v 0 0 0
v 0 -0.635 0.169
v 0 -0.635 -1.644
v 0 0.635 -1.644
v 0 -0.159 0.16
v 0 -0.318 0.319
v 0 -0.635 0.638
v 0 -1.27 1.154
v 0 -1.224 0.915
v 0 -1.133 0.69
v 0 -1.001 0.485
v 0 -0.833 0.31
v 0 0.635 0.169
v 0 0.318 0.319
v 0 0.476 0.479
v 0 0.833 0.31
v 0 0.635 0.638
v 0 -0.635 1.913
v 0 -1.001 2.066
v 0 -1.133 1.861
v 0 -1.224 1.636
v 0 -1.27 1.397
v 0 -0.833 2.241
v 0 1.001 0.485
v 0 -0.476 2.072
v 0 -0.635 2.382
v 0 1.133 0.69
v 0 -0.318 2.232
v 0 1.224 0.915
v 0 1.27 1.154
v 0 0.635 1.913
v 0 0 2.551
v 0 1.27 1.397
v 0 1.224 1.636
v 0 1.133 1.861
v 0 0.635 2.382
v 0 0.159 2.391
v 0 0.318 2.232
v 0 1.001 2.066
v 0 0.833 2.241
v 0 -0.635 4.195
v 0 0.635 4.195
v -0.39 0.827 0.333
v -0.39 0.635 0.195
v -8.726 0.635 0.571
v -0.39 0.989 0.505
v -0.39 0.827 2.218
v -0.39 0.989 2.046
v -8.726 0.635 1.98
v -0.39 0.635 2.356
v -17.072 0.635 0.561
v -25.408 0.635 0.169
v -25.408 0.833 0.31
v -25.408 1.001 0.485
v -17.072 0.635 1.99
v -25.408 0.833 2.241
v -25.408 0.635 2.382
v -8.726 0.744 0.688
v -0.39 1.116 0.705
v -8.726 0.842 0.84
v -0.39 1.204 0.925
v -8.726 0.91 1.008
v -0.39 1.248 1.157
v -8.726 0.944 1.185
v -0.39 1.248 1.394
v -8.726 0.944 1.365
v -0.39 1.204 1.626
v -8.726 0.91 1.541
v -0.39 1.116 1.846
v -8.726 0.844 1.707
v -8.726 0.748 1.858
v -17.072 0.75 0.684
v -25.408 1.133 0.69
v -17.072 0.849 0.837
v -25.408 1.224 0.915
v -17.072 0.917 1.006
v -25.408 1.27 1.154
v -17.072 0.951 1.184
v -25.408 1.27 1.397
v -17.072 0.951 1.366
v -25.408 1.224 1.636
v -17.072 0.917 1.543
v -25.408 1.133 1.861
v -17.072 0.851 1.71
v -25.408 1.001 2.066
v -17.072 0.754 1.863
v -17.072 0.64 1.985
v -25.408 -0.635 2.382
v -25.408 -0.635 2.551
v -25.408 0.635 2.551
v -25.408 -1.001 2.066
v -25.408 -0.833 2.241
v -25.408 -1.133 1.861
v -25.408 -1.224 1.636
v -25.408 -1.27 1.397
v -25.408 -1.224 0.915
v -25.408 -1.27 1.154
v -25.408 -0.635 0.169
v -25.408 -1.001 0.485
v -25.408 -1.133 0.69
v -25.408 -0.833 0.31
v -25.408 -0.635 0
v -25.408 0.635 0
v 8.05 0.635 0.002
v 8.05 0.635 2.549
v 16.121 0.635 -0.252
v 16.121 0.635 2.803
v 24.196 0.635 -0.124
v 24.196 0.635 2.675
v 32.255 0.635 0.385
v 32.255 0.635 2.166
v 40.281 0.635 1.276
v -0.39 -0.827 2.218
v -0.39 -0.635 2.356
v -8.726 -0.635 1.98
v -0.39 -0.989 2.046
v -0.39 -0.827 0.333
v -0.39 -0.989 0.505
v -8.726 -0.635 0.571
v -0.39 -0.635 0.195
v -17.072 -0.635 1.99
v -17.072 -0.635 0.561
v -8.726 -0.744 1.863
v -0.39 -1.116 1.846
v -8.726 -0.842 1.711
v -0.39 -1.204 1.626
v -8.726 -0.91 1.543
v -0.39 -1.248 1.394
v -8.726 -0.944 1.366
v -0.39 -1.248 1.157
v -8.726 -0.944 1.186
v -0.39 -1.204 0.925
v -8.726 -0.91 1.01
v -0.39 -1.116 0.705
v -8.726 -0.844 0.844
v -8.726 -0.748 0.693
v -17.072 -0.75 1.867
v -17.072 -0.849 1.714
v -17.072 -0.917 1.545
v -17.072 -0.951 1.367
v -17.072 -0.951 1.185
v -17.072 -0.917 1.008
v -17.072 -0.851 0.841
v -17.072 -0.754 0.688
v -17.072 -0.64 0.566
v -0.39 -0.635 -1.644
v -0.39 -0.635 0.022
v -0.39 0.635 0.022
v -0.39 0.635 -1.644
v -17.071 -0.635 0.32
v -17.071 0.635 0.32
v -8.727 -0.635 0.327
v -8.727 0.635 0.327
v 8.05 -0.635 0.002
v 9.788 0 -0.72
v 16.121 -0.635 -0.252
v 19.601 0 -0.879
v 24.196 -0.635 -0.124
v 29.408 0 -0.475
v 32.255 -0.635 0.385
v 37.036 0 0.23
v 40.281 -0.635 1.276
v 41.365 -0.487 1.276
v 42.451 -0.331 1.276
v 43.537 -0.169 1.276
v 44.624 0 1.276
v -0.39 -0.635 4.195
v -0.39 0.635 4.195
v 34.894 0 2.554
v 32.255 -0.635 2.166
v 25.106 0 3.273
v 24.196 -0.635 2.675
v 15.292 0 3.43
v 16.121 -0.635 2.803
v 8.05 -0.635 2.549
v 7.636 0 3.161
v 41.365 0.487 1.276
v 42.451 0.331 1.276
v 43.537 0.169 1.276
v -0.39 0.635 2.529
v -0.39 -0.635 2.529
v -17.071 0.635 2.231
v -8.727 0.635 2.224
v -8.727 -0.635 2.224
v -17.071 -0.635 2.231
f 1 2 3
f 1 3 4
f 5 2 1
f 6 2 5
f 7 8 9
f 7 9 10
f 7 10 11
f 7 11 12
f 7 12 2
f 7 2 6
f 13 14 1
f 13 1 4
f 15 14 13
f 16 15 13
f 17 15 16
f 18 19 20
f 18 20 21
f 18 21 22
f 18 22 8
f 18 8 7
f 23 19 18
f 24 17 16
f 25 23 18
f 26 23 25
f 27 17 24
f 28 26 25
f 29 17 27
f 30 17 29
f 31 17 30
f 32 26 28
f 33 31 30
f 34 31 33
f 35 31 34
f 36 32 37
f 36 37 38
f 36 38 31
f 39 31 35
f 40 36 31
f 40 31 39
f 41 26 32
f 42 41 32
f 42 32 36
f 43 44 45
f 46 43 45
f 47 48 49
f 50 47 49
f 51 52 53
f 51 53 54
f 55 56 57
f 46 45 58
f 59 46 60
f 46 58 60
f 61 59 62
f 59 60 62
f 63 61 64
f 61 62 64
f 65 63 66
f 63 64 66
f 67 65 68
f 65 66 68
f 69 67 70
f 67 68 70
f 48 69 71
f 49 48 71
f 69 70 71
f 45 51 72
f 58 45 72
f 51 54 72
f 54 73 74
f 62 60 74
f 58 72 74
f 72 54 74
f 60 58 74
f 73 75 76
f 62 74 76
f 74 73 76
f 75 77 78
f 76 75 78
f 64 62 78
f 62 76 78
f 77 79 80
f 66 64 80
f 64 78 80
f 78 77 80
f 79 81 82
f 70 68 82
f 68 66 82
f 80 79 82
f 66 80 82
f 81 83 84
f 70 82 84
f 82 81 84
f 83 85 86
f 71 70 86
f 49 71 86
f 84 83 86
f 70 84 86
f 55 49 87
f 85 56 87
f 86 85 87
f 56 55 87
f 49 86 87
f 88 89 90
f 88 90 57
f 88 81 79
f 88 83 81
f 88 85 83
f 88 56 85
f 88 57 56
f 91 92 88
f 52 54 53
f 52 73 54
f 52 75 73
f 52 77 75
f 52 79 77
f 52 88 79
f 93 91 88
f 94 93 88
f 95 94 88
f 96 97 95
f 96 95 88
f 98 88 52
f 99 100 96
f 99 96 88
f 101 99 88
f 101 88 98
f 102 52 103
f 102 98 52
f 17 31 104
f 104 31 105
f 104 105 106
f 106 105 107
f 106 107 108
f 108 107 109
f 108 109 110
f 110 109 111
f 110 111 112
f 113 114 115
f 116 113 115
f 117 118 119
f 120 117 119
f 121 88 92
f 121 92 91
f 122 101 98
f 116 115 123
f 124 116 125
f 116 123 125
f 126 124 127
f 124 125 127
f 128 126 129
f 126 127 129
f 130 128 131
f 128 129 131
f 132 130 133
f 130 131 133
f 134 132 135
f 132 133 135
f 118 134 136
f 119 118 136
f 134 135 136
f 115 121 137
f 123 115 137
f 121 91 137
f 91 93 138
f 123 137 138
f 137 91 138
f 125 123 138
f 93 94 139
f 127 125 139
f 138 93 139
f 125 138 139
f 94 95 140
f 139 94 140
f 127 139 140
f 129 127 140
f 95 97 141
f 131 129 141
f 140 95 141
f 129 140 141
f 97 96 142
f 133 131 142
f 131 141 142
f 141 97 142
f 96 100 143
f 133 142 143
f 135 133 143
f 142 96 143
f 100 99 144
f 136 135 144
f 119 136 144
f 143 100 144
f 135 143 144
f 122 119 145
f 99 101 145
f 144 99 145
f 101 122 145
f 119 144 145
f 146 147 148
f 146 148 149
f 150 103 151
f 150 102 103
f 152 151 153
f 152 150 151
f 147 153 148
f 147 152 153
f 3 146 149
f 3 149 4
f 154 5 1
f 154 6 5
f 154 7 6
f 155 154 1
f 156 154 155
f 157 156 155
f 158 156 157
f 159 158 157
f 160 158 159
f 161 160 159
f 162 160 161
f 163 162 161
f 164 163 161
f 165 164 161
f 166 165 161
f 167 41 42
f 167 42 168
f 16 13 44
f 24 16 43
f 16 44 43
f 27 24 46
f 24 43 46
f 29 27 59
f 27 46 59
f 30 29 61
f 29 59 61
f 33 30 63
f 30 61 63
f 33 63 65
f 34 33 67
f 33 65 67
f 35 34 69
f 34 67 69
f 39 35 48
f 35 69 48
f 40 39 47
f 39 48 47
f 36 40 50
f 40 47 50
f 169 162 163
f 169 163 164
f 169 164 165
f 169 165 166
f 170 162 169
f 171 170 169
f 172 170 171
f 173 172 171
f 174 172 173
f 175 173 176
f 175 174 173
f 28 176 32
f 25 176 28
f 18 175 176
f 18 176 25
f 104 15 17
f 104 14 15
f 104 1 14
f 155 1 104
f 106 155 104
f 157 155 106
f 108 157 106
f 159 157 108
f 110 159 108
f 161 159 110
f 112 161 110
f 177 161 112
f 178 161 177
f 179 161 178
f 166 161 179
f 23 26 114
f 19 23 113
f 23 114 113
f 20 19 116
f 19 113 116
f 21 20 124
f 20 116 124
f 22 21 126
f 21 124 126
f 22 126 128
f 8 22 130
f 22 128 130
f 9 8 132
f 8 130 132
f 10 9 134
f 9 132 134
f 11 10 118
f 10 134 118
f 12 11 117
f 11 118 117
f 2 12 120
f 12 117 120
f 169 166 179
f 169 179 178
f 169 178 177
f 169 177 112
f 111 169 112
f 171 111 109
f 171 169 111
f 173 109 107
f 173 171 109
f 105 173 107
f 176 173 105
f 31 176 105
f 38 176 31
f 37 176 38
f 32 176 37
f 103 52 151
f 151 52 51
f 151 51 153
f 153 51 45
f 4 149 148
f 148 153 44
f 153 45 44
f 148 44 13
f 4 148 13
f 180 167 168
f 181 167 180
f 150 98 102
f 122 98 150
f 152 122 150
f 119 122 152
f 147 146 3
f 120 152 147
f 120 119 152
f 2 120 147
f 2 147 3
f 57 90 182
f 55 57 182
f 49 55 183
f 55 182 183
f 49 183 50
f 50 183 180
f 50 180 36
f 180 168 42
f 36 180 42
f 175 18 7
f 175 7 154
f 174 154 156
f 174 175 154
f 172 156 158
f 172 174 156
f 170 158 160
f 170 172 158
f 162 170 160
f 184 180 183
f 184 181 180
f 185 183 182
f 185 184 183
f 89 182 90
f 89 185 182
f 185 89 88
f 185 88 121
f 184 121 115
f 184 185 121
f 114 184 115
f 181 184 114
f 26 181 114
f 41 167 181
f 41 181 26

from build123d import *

# Parameters (mm, degrees)
F2_DEPTH     = 0.635
F3_T4_ANGLE  = 16.069160735
F3_S5_R      = 171.2764102712
F3_T6_DEPTH  = 27
F3_T11_ANGLE = 16.069160735
F3_S13_R     = 171.2764102712
F3_T14_DEPTH = 27
F3_T18_ANGLE = 16.069160735
F3_S20_R     = 171.2764102712
F3_T21_DEPTH = 27
F3_T25_ANGLE = 16.069160735
F3_S27_R     = 171.2764102712
F3_T28_DEPTH = 27
F3_T33_ANGLE = 16.069160735
F3_S34_R     = 171.2764102712
F3_T35_DEPTH = 27
F3_T38_ANGLE = 16.069160735
F3_S39_R     = 171.2764102712
F3_T40_DEPTH = 27
F3_T46_ANGLE = 16.069160735
F3_S47_R     = 171.2764102712
F3_T48_DEPTH = 27
F3_T51_ANGLE = 16.069160735
F3_S52_R     = 171.2764102712
F3_T53_DEPTH = 27


# Not quite as in the source:
# - a fillet or chamfer that OpenCascade refuses, or shapes differently, is made with other operations: its cross-section is extruded or revolved along the edge and cut away or added


with BuildPart() as f1:
    # F0 (on Front) → F1 (revolve)
    with BuildSketch(Plane.XZ):
        with BuildLine():
            Line((-25.4078488797, 1.2755064527), (0, 1.2755064527))
            Line((0, 1.2755064527), (0, 2.5510129053))
            ThreePointArc((0, 2.5510129053), (-0.1948502254, 2.5399588642), (-0.3897100687, 2.5290756822))
            ThreePointArc((-0.3897100687, 2.5290756822), (-12.8990879478, 2.1882478839), (-25.4078488797, 2.5510129053))
            Line((-25.4078488797, 2.5510129053), (-25.4078488797, 1.2755064527))
        make_face()
    revolve(axis=Axis((-12.7039244398, 0, 1.2755064527), (1, 0, 0)))

    # F0 (on Front) → F2 (join, symmetric)
    with BuildSketch(Plane.XZ):
        with BuildLine():
            ThreePointArc((-0.3897100687, 0.0219372231), (-0.1948502254, 0.0110540411), (0, 0))
            Line((0, 0), (0, 1.2755064527))
            Line((0, 1.2755064527), (-25.4078488797, 1.2755064527))
            Line((-25.4078488797, 1.2755064527), (-25.4078488797, 0))
            ThreePointArc((-25.4078488797, 0), (-12.8990879478, 0.3627650215), (-0.3897100687, 0.0219372231))
        make_face()
        with BuildLine():
            Line((0, -1.6435489524), (0, 0))
            ThreePointArc((0, 0), (-0.1948502254, 0.0110540411), (-0.3897100687, 0.0219372231))
            Line((-0.3897100687, 0.0219372231), (-0.3897100687, -1.6435489524))
            Line((-0.3897100687, -1.6435489524), (0, -1.6435489524))
        make_face()
        with BuildLine():
            Line((0, 1.2755064527), (0, 0))
            ThreePointArc((0, 0), (22.353983247, -0.8223795413), (44.6244962513, 1.2755064527))
            Line((44.6244962513, 1.2755064527), (0, 1.2755064527))
        make_face()
        with BuildLine():
            Line((-25.4078488797, 1.2755064527), (0, 1.2755064527))
            Line((0, 1.2755064527), (0, 2.5510129053))
            ThreePointArc((0, 2.5510129053), (-0.1948502254, 2.5399588642), (-0.3897100687, 2.5290756822))
            ThreePointArc((-0.3897100687, 2.5290756822), (-12.8990879478, 2.1882478839), (-25.4078488797, 2.5510129053))
            Line((-25.4078488797, 2.5510129053), (-25.4078488797, 1.2755064527))
        make_face()
        with BuildLine():
            Line((0, 2.5510129053), (0, 1.2755064527))
            Line((0, 1.2755064527), (44.6244962513, 1.2755064527))
            ThreePointArc((44.6244962513, 1.2755064527), (22.353983247, 3.3733924466), (0, 2.5510129053))
        make_face()
        with BuildLine():
            ThreePointArc((-0.3897100687, 2.5290756822), (-0.1948502254, 2.5399588642), (0, 2.5510129053))
            Line((0, 2.5510129053), (0, 4.1945618577))
            Line((0, 4.1945618577), (-0.3897100687, 4.1945618577))
            Line((-0.3897100687, 4.1945618577), (-0.3897100687, 2.5290756822))
        make_face()
    extrude(amount=F2_DEPTH, both=True)

    # F3: chamfer of 0.635 on 4 edges, made by hand


with BuildPart() as f3_tool2:
    # F3_s3 → F3_t4 (revolve)
    with BuildSketch(Plane(origin=(44.7635003775, 0, -7.6289121798), x_dir=(0, 1, 0), z_dir=(0.9857862022, 0, -0.1680046534))):
        with BuildLine():
            Line((0.0179605122, 8.7802452438), (-0.6529605122, 8.1093242193))
            Line((-0.6529605122, 8.1093242193), (-0.6656605122, 8.1093242193))
            ThreePointArc((-0.6656605122, 8.1093242193), (-0.6477, 8.4358044754), (-0.6477, 8.7622847316))
            Line((-0.6477, 8.7622847316), (-0.635, 8.7749847316))
            ThreePointArc((-0.635, 8.7749847316), (-0.3085197439, 8.7749847316), (0.0179605122, 8.7929452438))
            Line((0.0179605122, 8.7929452438), (0.0179605122, 8.7802452438))
        make_face()
    revolve(axis=Axis((17.4603710483, -0.635, -167.8330947992), (0, -1, 0)), revolution_arc=F3_T4_ANGLE)

    # F3_s5 → F3_t6 (intersect, symmetric)
    with BuildSketch(Plane.XZ.offset(0.5)):
        with Locations((17.4603710483, 170.3841077045)):
            Circle(F3_S5_R)
    extrude(amount=F3_T6_DEPTH, both=True, mode=Mode.INTERSECT)

    split(bisect_by=Plane.YZ, keep=Keep.TOP)


with BuildPart() as f1_1:
    add(f1.part)

    # F3_t1: cut F3_tool2
    add(f3_tool2.part, mode=Mode.SUBTRACT)


with BuildPart() as f3_tool9:
    # F3_s10 → F3_t11 (revolve)
    with BuildSketch(Plane(origin=(44.7635003775, 0, -7.6289121798), x_dir=(0, 1, 0), z_dir=(0.9857862022, 0, -0.1680046534))):
        with BuildLine():
            Line((0.6529605122, 8.1093242193), (-0.0179605122, 8.7802452438))
            Line((-0.0179605122, 8.7802452438), (-0.0179605122, 8.7929452438))
            ThreePointArc((-0.0179605122, 8.7929452438), (0.3085197439, 8.7749847316), (0.635, 8.7749847316))
            Line((0.635, 8.7749847316), (0.6477, 8.7622847316))
            ThreePointArc((0.6477, 8.7622847316), (0.6477, 8.4358044754), (0.6656605122, 8.1093242193))
            Line((0.6656605122, 8.1093242193), (0.6529605122, 8.1093242193))
        make_face()
    revolve(axis=Axis((17.4603710483, 0.635, -167.8330947992), (0, -1, 0)), revolution_arc=F3_T11_ANGLE)

    split(bisect_by=Plane.YZ, keep=Keep.TOP)

    # F3_s13 → F3_t14 (intersect, symmetric)
    with BuildSketch(Plane.XZ.offset(-0.5)):
        with Locations((17.4603710483, 170.3841077045)):
            Circle(F3_S13_R)
    extrude(amount=F3_T14_DEPTH, both=True, mode=Mode.INTERSECT)


with BuildPart() as f1_2:
    add(f1_1.part)

    # F3_t8: cut F3_tool9
    add(f3_tool9.part, mode=Mode.SUBTRACT)


with BuildPart() as f3_tool16:
    # F3_s17 → F3_t18 (revolve)
    with BuildSketch(Plane(origin=(-1.6228435165, 0, 0.1819546373), x_dir=(0, 1, 0), z_dir=(-0.9937731026, 0, 0.1114227112))):
        with BuildLine():
            Line((0.6529605122, -0.6451754671), (-0.0179605122, 0.0257455574))
            Line((-0.0179605122, 0.0257455574), (-0.0179605122, 0.0384455574))
            ThreePointArc((-0.0179605122, 0.0384455574), (0.3085197439, 0.0204850452), (0.635, 0.0204850452))
            Line((0.635, 0.0204850452), (0.6477, 0.0077850452))
            ThreePointArc((0.6477, 0.0077850452), (0.6477, -0.318695211), (0.6656605122, -0.6451754671))
            Line((0.6656605122, -0.6451754671), (0.6529605122, -0.6451754671))
        make_face()
    revolve(axis=Axis((17.4603710483, 0.635, 170.3841077045), (0, -1, 0)), revolution_arc=F3_T18_ANGLE)

    split(bisect_by=Plane.YZ, keep=Keep.TOP)

    # F3_s20 → F3_t21 (intersect, symmetric)
    with BuildSketch(Plane.XZ.offset(-0.5)):
        with Locations((17.4603710483, -167.8330947992)):
            Circle(F3_S20_R)
    extrude(amount=F3_T21_DEPTH, both=True, mode=Mode.INTERSECT)


with BuildPart() as f1_3:
    add(f1_2.part)

    # F3_t15: cut F3_tool16
    add(f3_tool16.part, mode=Mode.SUBTRACT)


with BuildPart() as f3_tool23:
    # F3_s24 → F3_t25 (revolve)
    with BuildSketch(Plane(origin=(-1.6228435165, 0, 0.1819546373), x_dir=(0, 1, 0), z_dir=(-0.9937731026, 0, 0.1114227112))):
        with BuildLine():
            Line((0.0179605122, 0.0257455574), (-0.6529605122, -0.6451754671))
            Line((-0.6529605122, -0.6451754671), (-0.6656605122, -0.6451754671))
            ThreePointArc((-0.6656605122, -0.6451754671), (-0.6477, -0.318695211), (-0.6477, 0.0077850452))
            Line((-0.6477, 0.0077850452), (-0.635, 0.0204850452))
            ThreePointArc((-0.635, 0.0204850452), (-0.3085197439, 0.0204850452), (0.0179605122, 0.0384455574))
            Line((0.0179605122, 0.0384455574), (0.0179605122, 0.0257455574))
        make_face()
    revolve(axis=Axis((17.4603710483, -0.635, 170.3841077045), (0, -1, 0)), revolution_arc=F3_T25_ANGLE)

    split(bisect_by=Plane.YZ, keep=Keep.TOP)

    # F3_s27 → F3_t28 (intersect, symmetric)
    with BuildSketch(Plane.XZ.offset(0.5)):
        with Locations((17.4603710483, -167.8330947992)):
            Circle(F3_S27_R)
    extrude(amount=F3_T28_DEPTH, both=True, mode=Mode.INTERSECT)


with BuildPart() as f1_4:
    add(f1_3.part)

    # F3_t22: cut F3_tool23
    add(f3_tool23.part, mode=Mode.SUBTRACT)


with BuildPart() as f3_tool31:
    # F3_s32 → F3_t33 (revolve)
    with BuildSketch(Plane(origin=(-1.6228435165, 0, 0.1819546373), x_dir=(0, 1, 0), z_dir=(-0.9937731026, 0, 0.1114227112))):
        with BuildLine():
            Line((0.0179605122, 0.0257455574), (-0.6529605122, -0.6451754671))
            Line((-0.6529605122, -0.6451754671), (-0.6656605122, -0.6451754671))
            ThreePointArc((-0.6656605122, -0.6451754671), (-0.6477, -0.318695211), (-0.6477, 0.0077850452))
            Line((-0.6477, 0.0077850452), (-0.635, 0.0204850452))
            ThreePointArc((-0.635, 0.0204850452), (-0.3085197439, 0.0204850452), (0.0179605122, 0.0384455574))
            Line((0.0179605122, 0.0384455574), (0.0179605122, 0.0257455574))
        make_face()
    revolve(axis=Axis((17.4603710483, -0.635, 170.3841077045), (0, -1, 0)), revolution_arc=F3_T33_ANGLE)

    # F3_s34 → F3_t35 (cut, symmetric)
    with BuildSketch(Plane.XZ.offset(0.5)):
        with Locations((17.4603710483, -167.8330947992)):
            Circle(F3_S34_R)
    extrude(amount=F3_T35_DEPTH, both=True, mode=Mode.SUBTRACT)


with BuildPart() as f3_tool36:
    # F3_s37 → F3_t38 (revolve)
    with BuildSketch(Plane(origin=(44.7635003775, 0, -7.6289121798), x_dir=(0, 1, 0), z_dir=(0.9857862022, 0, -0.1680046534))):
        with BuildLine():
            Line((0.0179605122, 8.7802452438), (-0.6529605122, 8.1093242193))
            Line((-0.6529605122, 8.1093242193), (-0.6656605122, 8.1093242193))
            ThreePointArc((-0.6656605122, 8.1093242193), (-0.6477, 8.4358044754), (-0.6477, 8.7622847316))
            Line((-0.6477, 8.7622847316), (-0.635, 8.7749847316))
            ThreePointArc((-0.635, 8.7749847316), (-0.3085197439, 8.7749847316), (0.0179605122, 8.7929452438))
            Line((0.0179605122, 8.7929452438), (0.0179605122, 8.7802452438))
        make_face()
    revolve(axis=Axis((17.4603710483, -0.635, -167.8330947992), (0, -1, 0)), revolution_arc=F3_T38_ANGLE)

    # F3_s39 → F3_t40 (cut, symmetric)
    with BuildSketch(Plane.XZ.offset(0.5)):
        with Locations((17.4603710483, 170.3841077045)):
            Circle(F3_S39_R)
    extrude(amount=F3_T40_DEPTH, both=True, mode=Mode.SUBTRACT)


with BuildPart() as f3_tool31_1:
    add(f3_tool31.part)

    # F3_t41: intersect F3_tool36
    add(f3_tool36.part, mode=Mode.INTERSECT)


with BuildPart() as f1_5:
    add(f1_4.part)

    # F3_t29: cut F3_tool31
    add(f3_tool31_1.part, mode=Mode.SUBTRACT)


with BuildPart() as f3_tool44:
    # F3_s45 → F3_t46 (revolve)
    with BuildSketch(Plane(origin=(44.7635003775, 0, -7.6289121798), x_dir=(0, 1, 0), z_dir=(0.9857862022, 0, -0.1680046534))):
        with BuildLine():
            Line((0.6529605122, 8.1093242193), (-0.0179605122, 8.7802452438))
            Line((-0.0179605122, 8.7802452438), (-0.0179605122, 8.7929452438))
            ThreePointArc((-0.0179605122, 8.7929452438), (0.3085197439, 8.7749847316), (0.635, 8.7749847316))
            Line((0.635, 8.7749847316), (0.6477, 8.7622847316))
            ThreePointArc((0.6477, 8.7622847316), (0.6477, 8.4358044754), (0.6656605122, 8.1093242193))
            Line((0.6656605122, 8.1093242193), (0.6529605122, 8.1093242193))
        make_face()
    revolve(axis=Axis((17.4603710483, 0.635, -167.8330947992), (0, -1, 0)), revolution_arc=F3_T46_ANGLE)

    # F3_s47 → F3_t48 (cut, symmetric)
    with BuildSketch(Plane.XZ.offset(-0.5)):
        with Locations((17.4603710483, 170.3841077045)):
            Circle(F3_S47_R)
    extrude(amount=F3_T48_DEPTH, both=True, mode=Mode.SUBTRACT)


with BuildPart() as f3_tool49:
    # F3_s50 → F3_t51 (revolve)
    with BuildSketch(Plane(origin=(-1.6228435165, 0, 0.1819546373), x_dir=(0, 1, 0), z_dir=(-0.9937731026, 0, 0.1114227112))):
        with BuildLine():
            Line((0.6529605122, -0.6451754671), (-0.0179605122, 0.0257455574))
            Line((-0.0179605122, 0.0257455574), (-0.0179605122, 0.0384455574))
            ThreePointArc((-0.0179605122, 0.0384455574), (0.3085197439, 0.0204850452), (0.635, 0.0204850452))
            Line((0.635, 0.0204850452), (0.6477, 0.0077850452))
            ThreePointArc((0.6477, 0.0077850452), (0.6477, -0.318695211), (0.6656605122, -0.6451754671))
            Line((0.6656605122, -0.6451754671), (0.6529605122, -0.6451754671))
        make_face()
    revolve(axis=Axis((17.4603710483, 0.635, 170.3841077045), (0, -1, 0)), revolution_arc=F3_T51_ANGLE)

    # F3_s52 → F3_t53 (cut, symmetric)
    with BuildSketch(Plane.XZ.offset(-0.5)):
        with Locations((17.4603710483, -167.8330947992)):
            Circle(F3_S52_R)
    extrude(amount=F3_T53_DEPTH, both=True, mode=Mode.SUBTRACT)


with BuildPart() as f3_tool44_1:
    add(f3_tool44.part)

    # F3_t54: intersect F3_tool49
    add(f3_tool49.part, mode=Mode.INTERSECT)


with BuildPart() as f1_6:
    add(f1_5.part)

    # F3_t42: cut F3_tool44
    add(f3_tool44_1.part, mode=Mode.SUBTRACT)


solid = f1_6.part
